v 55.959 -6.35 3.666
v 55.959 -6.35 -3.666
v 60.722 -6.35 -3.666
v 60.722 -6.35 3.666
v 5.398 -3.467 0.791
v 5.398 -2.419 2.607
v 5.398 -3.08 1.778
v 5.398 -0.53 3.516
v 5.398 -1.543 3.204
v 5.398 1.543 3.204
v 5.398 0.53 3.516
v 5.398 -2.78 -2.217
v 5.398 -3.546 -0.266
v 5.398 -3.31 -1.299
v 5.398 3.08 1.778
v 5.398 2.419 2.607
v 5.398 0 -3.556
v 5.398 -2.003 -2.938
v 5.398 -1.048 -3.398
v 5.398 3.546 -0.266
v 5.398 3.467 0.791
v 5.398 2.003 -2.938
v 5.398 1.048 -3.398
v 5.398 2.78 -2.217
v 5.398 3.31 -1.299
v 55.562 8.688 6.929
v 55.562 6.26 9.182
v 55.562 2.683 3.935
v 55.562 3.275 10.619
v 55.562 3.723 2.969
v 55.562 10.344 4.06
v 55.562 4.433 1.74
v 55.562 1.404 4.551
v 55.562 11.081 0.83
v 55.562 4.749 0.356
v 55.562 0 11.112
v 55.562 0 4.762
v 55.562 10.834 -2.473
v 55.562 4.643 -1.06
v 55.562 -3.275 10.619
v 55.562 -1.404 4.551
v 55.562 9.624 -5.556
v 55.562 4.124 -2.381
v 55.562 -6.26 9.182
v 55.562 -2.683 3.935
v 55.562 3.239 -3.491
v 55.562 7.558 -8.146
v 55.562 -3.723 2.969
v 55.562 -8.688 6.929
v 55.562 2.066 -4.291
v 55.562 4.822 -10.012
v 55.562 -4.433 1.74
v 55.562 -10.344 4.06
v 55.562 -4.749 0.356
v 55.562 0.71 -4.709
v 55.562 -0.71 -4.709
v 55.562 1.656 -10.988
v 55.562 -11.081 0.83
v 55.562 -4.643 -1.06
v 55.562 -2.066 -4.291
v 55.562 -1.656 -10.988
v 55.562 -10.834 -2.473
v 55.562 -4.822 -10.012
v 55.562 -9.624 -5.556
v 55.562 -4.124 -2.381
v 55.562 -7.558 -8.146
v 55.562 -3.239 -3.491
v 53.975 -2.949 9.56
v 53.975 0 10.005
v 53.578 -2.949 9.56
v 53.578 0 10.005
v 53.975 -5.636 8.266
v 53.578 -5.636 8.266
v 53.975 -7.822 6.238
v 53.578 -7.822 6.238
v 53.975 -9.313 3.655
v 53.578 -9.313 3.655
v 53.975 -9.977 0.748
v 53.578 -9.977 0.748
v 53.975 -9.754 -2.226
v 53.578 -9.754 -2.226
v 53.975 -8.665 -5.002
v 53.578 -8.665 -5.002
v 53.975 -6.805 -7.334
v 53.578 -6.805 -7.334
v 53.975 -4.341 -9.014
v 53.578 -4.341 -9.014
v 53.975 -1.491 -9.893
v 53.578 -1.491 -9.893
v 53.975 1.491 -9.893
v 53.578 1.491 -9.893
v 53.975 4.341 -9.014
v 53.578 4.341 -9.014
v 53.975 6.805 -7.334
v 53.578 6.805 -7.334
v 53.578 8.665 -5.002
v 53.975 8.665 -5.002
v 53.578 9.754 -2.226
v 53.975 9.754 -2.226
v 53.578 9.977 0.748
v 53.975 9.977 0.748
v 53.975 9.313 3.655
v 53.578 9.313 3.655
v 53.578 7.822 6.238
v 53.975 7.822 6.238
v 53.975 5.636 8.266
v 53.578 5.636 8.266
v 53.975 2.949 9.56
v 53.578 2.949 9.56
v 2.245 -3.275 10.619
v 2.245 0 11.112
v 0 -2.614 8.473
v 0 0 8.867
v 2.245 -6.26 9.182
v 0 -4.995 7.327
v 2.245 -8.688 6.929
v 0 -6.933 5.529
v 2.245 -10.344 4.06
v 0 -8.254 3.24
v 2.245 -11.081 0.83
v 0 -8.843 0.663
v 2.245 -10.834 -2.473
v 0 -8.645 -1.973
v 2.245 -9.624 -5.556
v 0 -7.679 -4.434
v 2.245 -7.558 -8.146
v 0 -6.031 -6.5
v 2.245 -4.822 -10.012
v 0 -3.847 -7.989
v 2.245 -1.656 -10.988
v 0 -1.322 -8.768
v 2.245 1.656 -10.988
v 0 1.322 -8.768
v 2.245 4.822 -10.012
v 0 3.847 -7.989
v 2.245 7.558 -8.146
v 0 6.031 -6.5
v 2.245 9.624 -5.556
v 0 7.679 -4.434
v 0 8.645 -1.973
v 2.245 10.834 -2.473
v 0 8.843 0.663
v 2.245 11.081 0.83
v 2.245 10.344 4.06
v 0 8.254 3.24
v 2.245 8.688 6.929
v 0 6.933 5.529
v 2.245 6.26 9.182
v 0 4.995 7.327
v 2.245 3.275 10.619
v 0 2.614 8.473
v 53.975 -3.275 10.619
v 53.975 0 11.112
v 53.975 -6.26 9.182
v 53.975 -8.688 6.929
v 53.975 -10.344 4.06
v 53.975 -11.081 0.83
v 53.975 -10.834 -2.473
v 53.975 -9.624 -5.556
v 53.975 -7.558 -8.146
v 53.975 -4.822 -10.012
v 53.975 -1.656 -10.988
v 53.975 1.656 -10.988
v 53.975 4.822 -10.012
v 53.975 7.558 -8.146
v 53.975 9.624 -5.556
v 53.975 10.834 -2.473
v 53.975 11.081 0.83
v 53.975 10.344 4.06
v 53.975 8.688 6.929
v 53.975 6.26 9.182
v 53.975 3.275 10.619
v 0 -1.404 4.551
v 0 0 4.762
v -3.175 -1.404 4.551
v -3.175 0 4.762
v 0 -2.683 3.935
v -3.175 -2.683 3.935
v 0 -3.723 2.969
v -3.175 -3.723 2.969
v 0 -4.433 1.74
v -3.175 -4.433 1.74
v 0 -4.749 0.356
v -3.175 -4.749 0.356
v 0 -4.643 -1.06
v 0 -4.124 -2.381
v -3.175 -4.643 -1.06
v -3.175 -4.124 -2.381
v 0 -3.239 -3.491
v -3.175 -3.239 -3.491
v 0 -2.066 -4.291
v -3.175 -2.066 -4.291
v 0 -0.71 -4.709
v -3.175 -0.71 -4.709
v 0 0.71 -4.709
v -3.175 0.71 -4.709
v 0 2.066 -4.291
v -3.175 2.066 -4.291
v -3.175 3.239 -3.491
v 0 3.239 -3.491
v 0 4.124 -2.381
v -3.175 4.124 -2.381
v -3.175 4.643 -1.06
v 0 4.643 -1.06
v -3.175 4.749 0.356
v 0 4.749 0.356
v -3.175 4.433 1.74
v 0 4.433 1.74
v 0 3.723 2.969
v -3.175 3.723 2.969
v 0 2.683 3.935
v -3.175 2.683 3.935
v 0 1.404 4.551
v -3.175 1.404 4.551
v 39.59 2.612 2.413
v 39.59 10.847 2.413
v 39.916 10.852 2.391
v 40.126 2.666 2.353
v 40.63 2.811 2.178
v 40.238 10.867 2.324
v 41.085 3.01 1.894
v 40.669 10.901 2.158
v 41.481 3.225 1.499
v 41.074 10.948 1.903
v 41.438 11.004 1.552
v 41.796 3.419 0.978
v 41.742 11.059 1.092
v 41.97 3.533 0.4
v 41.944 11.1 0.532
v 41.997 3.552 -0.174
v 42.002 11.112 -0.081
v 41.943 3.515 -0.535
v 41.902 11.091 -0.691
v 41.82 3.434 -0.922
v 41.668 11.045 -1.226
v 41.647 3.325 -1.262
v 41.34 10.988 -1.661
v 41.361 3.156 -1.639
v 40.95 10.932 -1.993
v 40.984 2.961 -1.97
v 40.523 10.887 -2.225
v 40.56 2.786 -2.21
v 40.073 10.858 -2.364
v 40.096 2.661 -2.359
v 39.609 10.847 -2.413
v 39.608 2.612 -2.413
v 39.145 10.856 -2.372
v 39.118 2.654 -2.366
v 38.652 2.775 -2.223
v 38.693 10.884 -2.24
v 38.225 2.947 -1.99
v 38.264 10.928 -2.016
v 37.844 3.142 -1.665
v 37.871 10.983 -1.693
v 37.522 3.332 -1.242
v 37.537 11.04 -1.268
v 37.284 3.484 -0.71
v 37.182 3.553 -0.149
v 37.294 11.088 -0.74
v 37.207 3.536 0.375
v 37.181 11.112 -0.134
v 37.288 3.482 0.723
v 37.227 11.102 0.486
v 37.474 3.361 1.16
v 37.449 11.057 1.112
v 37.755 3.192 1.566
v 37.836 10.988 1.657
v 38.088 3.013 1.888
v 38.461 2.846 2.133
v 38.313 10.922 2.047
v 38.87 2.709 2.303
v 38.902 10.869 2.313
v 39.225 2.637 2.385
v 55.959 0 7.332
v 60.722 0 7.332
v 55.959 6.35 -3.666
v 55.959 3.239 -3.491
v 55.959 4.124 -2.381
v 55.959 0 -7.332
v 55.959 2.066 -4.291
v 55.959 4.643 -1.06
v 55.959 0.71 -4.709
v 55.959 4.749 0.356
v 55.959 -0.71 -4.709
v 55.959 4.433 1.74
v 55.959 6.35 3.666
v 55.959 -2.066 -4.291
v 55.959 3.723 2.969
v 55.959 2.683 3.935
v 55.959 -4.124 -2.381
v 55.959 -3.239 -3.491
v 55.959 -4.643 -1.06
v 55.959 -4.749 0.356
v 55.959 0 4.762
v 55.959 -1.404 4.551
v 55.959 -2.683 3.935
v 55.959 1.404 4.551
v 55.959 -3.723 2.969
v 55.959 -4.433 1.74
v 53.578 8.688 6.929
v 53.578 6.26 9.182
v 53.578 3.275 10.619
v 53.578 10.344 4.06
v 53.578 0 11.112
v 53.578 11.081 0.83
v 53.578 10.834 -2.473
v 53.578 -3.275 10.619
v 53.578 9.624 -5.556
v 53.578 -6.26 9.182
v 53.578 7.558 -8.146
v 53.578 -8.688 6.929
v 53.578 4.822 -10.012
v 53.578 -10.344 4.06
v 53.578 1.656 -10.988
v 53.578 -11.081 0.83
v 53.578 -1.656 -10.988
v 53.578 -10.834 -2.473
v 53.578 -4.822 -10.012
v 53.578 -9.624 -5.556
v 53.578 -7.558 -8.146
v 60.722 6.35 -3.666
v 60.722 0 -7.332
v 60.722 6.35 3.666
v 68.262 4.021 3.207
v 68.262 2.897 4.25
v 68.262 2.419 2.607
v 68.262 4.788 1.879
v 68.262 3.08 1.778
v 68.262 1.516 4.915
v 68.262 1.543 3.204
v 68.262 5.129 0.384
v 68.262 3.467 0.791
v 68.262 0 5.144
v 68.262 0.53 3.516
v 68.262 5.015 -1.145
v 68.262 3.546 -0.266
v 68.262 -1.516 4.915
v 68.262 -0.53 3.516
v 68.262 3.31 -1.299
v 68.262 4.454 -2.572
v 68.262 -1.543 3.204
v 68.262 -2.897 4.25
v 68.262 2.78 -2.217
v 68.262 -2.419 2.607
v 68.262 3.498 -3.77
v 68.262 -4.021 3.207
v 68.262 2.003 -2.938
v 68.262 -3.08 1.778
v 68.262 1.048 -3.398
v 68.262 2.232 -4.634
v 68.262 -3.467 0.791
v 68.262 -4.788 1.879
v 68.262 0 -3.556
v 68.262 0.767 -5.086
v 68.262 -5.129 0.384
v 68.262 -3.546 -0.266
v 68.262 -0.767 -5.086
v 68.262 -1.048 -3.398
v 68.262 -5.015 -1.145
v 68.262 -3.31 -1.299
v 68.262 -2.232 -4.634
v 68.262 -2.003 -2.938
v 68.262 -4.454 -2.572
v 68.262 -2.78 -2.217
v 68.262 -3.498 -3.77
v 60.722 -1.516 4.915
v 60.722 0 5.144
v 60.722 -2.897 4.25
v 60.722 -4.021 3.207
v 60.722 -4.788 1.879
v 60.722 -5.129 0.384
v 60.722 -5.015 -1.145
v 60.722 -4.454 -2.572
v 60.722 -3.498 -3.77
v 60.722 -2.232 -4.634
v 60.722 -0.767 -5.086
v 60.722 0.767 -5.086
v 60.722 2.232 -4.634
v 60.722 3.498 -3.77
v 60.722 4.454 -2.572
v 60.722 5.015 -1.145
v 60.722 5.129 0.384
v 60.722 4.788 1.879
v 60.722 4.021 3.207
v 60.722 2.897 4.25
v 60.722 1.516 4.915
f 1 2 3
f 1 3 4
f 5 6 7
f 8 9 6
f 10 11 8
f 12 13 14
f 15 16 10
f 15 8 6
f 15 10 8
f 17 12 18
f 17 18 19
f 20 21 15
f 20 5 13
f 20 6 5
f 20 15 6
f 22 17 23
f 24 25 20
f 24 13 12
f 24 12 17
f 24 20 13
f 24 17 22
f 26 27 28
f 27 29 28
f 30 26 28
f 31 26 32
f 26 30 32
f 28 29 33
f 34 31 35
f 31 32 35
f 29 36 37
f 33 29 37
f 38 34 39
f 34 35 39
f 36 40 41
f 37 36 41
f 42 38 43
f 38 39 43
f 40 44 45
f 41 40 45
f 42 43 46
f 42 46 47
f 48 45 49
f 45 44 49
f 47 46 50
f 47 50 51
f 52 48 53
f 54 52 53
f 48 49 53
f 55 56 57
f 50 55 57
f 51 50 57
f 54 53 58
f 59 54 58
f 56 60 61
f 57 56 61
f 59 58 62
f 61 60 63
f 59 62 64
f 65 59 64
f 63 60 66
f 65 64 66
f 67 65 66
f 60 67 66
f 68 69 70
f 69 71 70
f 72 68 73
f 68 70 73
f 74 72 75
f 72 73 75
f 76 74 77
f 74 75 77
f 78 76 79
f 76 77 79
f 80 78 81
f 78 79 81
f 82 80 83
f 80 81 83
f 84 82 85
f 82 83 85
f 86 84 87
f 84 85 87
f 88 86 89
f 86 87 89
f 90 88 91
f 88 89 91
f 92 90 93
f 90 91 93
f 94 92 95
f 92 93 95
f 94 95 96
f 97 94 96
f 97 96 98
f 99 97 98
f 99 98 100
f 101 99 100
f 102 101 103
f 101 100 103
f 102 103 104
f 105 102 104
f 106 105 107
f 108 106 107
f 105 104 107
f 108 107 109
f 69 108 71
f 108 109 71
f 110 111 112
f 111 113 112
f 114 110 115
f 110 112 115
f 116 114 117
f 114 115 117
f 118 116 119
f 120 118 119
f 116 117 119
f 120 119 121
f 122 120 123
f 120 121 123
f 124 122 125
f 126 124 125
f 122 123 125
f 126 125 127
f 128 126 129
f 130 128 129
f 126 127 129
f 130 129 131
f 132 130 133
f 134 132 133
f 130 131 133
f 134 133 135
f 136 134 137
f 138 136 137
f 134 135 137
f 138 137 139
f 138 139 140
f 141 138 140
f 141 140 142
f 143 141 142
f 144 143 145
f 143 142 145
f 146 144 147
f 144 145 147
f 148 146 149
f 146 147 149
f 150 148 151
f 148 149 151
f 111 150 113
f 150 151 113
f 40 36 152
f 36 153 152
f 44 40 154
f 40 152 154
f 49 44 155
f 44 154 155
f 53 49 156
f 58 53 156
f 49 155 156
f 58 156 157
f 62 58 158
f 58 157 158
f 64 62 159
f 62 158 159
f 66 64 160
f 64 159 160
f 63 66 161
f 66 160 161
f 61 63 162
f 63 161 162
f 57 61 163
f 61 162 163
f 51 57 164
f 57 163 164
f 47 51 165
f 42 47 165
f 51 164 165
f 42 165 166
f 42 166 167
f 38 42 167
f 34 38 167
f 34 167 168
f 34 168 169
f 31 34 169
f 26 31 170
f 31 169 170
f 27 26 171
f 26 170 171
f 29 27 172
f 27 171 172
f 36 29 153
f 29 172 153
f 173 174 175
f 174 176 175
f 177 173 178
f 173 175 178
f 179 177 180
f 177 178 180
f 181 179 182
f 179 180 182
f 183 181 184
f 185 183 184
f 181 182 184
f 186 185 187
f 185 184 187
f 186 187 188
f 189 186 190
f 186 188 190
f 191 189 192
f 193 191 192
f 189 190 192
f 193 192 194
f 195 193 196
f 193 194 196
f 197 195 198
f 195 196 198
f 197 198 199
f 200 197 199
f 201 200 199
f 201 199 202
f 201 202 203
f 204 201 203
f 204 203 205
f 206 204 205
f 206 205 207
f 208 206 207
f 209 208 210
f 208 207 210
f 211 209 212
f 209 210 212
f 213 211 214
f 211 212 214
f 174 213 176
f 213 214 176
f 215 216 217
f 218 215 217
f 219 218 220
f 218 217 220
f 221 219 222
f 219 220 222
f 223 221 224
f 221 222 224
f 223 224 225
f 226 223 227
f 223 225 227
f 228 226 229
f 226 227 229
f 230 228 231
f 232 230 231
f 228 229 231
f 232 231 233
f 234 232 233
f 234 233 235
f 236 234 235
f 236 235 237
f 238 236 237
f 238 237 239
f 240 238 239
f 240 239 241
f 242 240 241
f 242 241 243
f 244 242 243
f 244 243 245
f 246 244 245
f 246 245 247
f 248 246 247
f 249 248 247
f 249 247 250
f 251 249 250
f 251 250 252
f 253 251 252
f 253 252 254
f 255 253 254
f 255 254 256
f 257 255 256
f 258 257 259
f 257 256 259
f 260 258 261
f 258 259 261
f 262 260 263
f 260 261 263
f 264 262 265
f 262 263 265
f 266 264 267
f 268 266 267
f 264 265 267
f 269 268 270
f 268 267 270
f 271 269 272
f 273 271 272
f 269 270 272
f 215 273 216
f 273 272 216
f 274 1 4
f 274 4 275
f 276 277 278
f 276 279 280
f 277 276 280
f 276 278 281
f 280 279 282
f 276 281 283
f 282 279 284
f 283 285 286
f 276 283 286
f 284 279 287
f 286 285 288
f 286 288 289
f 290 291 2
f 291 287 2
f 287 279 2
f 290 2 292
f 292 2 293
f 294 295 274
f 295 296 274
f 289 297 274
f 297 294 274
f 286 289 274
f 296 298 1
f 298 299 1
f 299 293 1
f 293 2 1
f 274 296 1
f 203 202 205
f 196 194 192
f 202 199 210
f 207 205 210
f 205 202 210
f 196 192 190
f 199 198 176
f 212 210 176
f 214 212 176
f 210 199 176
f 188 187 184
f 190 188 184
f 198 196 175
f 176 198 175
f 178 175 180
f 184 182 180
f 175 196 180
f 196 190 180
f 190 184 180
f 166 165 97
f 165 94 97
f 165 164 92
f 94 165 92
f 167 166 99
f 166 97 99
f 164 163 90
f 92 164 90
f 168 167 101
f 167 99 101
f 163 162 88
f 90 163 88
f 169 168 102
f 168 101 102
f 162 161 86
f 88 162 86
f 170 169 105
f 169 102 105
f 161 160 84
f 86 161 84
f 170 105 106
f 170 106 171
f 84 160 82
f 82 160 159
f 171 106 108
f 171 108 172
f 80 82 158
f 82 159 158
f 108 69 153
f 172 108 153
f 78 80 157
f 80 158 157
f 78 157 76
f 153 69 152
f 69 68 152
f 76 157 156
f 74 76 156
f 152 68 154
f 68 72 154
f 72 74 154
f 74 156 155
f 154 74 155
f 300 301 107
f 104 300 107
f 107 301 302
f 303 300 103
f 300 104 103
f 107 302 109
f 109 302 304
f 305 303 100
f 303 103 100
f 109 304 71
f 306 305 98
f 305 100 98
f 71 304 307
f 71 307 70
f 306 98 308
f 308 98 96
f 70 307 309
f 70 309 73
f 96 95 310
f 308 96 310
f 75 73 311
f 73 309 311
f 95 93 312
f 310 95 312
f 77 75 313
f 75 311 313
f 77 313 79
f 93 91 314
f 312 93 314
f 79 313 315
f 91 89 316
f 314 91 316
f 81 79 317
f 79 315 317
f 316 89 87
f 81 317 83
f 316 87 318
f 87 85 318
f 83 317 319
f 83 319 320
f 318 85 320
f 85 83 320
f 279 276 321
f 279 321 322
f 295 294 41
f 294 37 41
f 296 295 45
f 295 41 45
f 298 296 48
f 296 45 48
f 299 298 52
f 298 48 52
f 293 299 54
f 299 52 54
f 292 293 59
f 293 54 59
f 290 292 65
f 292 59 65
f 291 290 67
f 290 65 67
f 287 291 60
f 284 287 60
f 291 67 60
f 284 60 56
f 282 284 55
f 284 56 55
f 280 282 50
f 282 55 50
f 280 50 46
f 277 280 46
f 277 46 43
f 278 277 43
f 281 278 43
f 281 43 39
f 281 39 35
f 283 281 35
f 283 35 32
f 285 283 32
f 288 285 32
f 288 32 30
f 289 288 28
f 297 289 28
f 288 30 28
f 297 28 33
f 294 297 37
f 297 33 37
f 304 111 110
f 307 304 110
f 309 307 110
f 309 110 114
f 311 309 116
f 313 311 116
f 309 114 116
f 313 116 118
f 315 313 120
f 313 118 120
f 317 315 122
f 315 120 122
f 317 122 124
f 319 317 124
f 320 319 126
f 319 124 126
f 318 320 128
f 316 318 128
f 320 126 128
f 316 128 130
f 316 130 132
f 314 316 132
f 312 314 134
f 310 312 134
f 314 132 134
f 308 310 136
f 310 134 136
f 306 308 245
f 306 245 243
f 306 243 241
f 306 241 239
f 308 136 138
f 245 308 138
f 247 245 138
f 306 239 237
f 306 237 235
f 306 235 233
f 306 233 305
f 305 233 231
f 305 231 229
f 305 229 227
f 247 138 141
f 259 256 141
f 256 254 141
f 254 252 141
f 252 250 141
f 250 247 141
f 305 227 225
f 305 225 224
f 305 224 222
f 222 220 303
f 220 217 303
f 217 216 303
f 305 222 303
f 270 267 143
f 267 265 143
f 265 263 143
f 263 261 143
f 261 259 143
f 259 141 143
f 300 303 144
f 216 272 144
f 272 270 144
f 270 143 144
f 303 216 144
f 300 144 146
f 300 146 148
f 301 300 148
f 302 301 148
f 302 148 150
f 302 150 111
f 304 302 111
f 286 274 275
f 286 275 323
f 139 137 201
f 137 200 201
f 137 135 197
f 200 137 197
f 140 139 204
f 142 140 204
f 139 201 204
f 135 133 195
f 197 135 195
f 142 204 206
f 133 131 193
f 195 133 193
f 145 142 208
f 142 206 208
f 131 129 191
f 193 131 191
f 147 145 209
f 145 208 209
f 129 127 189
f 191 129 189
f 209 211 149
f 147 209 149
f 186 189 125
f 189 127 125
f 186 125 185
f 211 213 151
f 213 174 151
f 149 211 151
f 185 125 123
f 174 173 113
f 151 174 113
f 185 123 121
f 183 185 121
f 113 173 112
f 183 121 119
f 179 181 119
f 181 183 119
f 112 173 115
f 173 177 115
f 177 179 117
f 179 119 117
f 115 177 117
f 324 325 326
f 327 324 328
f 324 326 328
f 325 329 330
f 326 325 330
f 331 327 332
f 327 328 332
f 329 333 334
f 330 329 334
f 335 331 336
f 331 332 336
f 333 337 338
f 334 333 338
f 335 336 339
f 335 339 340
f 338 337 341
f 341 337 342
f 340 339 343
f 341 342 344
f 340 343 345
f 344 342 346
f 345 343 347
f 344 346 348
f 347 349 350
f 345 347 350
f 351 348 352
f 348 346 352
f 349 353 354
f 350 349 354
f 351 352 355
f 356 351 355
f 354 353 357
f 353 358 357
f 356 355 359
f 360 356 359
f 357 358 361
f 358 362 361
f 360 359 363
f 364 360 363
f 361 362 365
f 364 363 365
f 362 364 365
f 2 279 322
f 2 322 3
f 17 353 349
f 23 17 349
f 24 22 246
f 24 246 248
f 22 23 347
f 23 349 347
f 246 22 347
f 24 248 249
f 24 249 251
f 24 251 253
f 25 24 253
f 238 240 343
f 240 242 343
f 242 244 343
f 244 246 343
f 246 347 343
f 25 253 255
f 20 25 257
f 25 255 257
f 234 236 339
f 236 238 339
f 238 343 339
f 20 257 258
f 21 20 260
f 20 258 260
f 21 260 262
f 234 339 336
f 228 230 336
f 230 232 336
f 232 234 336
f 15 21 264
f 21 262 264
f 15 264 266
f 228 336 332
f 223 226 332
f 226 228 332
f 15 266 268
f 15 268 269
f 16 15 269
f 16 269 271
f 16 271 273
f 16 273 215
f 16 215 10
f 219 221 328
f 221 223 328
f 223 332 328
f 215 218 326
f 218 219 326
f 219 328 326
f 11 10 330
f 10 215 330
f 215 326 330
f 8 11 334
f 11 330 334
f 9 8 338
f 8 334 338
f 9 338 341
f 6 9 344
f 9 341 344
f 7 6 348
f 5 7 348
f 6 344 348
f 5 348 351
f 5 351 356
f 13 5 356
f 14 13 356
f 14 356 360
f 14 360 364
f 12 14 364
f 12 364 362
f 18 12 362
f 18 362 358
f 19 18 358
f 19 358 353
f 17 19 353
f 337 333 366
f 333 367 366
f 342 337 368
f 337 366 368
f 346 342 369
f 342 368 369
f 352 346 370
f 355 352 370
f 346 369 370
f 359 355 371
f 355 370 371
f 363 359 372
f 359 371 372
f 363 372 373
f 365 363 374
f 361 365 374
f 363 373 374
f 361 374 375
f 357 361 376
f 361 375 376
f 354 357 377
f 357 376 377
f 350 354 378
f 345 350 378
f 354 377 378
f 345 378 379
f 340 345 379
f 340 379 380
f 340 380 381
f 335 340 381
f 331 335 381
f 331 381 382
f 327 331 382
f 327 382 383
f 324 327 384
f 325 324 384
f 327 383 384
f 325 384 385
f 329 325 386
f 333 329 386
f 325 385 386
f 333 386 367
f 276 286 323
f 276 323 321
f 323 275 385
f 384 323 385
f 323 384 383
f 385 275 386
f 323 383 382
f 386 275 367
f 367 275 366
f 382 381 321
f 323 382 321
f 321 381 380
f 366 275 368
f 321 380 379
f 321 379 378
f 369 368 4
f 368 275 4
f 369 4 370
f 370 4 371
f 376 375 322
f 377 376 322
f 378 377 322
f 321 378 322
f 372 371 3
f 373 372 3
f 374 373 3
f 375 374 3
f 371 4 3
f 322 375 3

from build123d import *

# Parameters (mm, degrees)
CUT_EXTRUDE1_START = -5.0165
SKETCH2_R          = 8.745419401
CUT_EXTRUDE1_DEPTH = 5.0165
SKETCH3_R          = 2.413
CUT_EXTRUDE2_DEPTH = 11.557
SKETCH4_R          = 3.556
CUT_EXTRUDE3_DEPTH = 62.865


with BuildPart() as part:
    # Sketch1 → Revolve1 (revolve)
    with BuildSketch(Plane.XY, mode=Mode.PRIVATE) as revolve1_sk:
        Polygon((2.24506403, 11.1125), (0, 8.86743597), (0, 4.7625), (-3.175, 4.7625), (-3.175, 0), (0, 0), (55.5625, 0), (68.2625, 0), (68.2625, 5.1435), (60.721875, 5.1435), (60.721875, 8.745419401), (55.959375, 8.745419401), (55.959375, 4.7625), (55.5625, 4.7625), (55.5625, 11.1125), (53.975, 11.1125), (53.975, 10.004904014), (53.578125, 10.004904014), (53.578125, 11.1125), align=None)
    revolve(revolve1_sk.sketch.rotate(Axis((0, 0, 0), (1, 0, 0)), 90), axis=Axis((0, 0, 0), (1, 0, 0)))

    # Sketch2 → Cut-Extrude1 (cut)
    with BuildSketch(Plane(origin=(60.721875, 0, 0), x_dir=(0, 0, -1), z_dir=(1, 0, 0)).offset(CUT_EXTRUDE1_START)):
        Circle(SKETCH2_R)
        Polygon((-3.666174209, 6.35), (3.666174209, 6.35), (7.332348419, 0), (3.666174209, -6.35), (-3.666174209, -6.35), (-7.332348419, 0), align=None, mode=Mode.SUBTRACT)
    extrude(amount=CUT_EXTRUDE1_DEPTH, mode=Mode.SUBTRACT)

    # Sketch3 → Cut-Extrude2 (cut)
    with BuildSketch(Plane(origin=(0, 11.1125, 0), x_dir=(1, 0, 0), z_dir=(0, 1, 0))):
        with Locations(Location((39.590311937, 0, 0), (0, 0, 270))):
            Circle(SKETCH3_R)
    extrude(amount=-CUT_EXTRUDE2_DEPTH, mode=Mode.SUBTRACT)

    # Sketch4 → Cut-Extrude3 (cut)
    with BuildSketch(Plane(origin=(68.2625, 0, 0), x_dir=(0, 0, -1), z_dir=(1, 0, 0))):
        Circle(SKETCH4_R)
    extrude(amount=-CUT_EXTRUDE3_DEPTH, mode=Mode.SUBTRACT)


solid = part.part
